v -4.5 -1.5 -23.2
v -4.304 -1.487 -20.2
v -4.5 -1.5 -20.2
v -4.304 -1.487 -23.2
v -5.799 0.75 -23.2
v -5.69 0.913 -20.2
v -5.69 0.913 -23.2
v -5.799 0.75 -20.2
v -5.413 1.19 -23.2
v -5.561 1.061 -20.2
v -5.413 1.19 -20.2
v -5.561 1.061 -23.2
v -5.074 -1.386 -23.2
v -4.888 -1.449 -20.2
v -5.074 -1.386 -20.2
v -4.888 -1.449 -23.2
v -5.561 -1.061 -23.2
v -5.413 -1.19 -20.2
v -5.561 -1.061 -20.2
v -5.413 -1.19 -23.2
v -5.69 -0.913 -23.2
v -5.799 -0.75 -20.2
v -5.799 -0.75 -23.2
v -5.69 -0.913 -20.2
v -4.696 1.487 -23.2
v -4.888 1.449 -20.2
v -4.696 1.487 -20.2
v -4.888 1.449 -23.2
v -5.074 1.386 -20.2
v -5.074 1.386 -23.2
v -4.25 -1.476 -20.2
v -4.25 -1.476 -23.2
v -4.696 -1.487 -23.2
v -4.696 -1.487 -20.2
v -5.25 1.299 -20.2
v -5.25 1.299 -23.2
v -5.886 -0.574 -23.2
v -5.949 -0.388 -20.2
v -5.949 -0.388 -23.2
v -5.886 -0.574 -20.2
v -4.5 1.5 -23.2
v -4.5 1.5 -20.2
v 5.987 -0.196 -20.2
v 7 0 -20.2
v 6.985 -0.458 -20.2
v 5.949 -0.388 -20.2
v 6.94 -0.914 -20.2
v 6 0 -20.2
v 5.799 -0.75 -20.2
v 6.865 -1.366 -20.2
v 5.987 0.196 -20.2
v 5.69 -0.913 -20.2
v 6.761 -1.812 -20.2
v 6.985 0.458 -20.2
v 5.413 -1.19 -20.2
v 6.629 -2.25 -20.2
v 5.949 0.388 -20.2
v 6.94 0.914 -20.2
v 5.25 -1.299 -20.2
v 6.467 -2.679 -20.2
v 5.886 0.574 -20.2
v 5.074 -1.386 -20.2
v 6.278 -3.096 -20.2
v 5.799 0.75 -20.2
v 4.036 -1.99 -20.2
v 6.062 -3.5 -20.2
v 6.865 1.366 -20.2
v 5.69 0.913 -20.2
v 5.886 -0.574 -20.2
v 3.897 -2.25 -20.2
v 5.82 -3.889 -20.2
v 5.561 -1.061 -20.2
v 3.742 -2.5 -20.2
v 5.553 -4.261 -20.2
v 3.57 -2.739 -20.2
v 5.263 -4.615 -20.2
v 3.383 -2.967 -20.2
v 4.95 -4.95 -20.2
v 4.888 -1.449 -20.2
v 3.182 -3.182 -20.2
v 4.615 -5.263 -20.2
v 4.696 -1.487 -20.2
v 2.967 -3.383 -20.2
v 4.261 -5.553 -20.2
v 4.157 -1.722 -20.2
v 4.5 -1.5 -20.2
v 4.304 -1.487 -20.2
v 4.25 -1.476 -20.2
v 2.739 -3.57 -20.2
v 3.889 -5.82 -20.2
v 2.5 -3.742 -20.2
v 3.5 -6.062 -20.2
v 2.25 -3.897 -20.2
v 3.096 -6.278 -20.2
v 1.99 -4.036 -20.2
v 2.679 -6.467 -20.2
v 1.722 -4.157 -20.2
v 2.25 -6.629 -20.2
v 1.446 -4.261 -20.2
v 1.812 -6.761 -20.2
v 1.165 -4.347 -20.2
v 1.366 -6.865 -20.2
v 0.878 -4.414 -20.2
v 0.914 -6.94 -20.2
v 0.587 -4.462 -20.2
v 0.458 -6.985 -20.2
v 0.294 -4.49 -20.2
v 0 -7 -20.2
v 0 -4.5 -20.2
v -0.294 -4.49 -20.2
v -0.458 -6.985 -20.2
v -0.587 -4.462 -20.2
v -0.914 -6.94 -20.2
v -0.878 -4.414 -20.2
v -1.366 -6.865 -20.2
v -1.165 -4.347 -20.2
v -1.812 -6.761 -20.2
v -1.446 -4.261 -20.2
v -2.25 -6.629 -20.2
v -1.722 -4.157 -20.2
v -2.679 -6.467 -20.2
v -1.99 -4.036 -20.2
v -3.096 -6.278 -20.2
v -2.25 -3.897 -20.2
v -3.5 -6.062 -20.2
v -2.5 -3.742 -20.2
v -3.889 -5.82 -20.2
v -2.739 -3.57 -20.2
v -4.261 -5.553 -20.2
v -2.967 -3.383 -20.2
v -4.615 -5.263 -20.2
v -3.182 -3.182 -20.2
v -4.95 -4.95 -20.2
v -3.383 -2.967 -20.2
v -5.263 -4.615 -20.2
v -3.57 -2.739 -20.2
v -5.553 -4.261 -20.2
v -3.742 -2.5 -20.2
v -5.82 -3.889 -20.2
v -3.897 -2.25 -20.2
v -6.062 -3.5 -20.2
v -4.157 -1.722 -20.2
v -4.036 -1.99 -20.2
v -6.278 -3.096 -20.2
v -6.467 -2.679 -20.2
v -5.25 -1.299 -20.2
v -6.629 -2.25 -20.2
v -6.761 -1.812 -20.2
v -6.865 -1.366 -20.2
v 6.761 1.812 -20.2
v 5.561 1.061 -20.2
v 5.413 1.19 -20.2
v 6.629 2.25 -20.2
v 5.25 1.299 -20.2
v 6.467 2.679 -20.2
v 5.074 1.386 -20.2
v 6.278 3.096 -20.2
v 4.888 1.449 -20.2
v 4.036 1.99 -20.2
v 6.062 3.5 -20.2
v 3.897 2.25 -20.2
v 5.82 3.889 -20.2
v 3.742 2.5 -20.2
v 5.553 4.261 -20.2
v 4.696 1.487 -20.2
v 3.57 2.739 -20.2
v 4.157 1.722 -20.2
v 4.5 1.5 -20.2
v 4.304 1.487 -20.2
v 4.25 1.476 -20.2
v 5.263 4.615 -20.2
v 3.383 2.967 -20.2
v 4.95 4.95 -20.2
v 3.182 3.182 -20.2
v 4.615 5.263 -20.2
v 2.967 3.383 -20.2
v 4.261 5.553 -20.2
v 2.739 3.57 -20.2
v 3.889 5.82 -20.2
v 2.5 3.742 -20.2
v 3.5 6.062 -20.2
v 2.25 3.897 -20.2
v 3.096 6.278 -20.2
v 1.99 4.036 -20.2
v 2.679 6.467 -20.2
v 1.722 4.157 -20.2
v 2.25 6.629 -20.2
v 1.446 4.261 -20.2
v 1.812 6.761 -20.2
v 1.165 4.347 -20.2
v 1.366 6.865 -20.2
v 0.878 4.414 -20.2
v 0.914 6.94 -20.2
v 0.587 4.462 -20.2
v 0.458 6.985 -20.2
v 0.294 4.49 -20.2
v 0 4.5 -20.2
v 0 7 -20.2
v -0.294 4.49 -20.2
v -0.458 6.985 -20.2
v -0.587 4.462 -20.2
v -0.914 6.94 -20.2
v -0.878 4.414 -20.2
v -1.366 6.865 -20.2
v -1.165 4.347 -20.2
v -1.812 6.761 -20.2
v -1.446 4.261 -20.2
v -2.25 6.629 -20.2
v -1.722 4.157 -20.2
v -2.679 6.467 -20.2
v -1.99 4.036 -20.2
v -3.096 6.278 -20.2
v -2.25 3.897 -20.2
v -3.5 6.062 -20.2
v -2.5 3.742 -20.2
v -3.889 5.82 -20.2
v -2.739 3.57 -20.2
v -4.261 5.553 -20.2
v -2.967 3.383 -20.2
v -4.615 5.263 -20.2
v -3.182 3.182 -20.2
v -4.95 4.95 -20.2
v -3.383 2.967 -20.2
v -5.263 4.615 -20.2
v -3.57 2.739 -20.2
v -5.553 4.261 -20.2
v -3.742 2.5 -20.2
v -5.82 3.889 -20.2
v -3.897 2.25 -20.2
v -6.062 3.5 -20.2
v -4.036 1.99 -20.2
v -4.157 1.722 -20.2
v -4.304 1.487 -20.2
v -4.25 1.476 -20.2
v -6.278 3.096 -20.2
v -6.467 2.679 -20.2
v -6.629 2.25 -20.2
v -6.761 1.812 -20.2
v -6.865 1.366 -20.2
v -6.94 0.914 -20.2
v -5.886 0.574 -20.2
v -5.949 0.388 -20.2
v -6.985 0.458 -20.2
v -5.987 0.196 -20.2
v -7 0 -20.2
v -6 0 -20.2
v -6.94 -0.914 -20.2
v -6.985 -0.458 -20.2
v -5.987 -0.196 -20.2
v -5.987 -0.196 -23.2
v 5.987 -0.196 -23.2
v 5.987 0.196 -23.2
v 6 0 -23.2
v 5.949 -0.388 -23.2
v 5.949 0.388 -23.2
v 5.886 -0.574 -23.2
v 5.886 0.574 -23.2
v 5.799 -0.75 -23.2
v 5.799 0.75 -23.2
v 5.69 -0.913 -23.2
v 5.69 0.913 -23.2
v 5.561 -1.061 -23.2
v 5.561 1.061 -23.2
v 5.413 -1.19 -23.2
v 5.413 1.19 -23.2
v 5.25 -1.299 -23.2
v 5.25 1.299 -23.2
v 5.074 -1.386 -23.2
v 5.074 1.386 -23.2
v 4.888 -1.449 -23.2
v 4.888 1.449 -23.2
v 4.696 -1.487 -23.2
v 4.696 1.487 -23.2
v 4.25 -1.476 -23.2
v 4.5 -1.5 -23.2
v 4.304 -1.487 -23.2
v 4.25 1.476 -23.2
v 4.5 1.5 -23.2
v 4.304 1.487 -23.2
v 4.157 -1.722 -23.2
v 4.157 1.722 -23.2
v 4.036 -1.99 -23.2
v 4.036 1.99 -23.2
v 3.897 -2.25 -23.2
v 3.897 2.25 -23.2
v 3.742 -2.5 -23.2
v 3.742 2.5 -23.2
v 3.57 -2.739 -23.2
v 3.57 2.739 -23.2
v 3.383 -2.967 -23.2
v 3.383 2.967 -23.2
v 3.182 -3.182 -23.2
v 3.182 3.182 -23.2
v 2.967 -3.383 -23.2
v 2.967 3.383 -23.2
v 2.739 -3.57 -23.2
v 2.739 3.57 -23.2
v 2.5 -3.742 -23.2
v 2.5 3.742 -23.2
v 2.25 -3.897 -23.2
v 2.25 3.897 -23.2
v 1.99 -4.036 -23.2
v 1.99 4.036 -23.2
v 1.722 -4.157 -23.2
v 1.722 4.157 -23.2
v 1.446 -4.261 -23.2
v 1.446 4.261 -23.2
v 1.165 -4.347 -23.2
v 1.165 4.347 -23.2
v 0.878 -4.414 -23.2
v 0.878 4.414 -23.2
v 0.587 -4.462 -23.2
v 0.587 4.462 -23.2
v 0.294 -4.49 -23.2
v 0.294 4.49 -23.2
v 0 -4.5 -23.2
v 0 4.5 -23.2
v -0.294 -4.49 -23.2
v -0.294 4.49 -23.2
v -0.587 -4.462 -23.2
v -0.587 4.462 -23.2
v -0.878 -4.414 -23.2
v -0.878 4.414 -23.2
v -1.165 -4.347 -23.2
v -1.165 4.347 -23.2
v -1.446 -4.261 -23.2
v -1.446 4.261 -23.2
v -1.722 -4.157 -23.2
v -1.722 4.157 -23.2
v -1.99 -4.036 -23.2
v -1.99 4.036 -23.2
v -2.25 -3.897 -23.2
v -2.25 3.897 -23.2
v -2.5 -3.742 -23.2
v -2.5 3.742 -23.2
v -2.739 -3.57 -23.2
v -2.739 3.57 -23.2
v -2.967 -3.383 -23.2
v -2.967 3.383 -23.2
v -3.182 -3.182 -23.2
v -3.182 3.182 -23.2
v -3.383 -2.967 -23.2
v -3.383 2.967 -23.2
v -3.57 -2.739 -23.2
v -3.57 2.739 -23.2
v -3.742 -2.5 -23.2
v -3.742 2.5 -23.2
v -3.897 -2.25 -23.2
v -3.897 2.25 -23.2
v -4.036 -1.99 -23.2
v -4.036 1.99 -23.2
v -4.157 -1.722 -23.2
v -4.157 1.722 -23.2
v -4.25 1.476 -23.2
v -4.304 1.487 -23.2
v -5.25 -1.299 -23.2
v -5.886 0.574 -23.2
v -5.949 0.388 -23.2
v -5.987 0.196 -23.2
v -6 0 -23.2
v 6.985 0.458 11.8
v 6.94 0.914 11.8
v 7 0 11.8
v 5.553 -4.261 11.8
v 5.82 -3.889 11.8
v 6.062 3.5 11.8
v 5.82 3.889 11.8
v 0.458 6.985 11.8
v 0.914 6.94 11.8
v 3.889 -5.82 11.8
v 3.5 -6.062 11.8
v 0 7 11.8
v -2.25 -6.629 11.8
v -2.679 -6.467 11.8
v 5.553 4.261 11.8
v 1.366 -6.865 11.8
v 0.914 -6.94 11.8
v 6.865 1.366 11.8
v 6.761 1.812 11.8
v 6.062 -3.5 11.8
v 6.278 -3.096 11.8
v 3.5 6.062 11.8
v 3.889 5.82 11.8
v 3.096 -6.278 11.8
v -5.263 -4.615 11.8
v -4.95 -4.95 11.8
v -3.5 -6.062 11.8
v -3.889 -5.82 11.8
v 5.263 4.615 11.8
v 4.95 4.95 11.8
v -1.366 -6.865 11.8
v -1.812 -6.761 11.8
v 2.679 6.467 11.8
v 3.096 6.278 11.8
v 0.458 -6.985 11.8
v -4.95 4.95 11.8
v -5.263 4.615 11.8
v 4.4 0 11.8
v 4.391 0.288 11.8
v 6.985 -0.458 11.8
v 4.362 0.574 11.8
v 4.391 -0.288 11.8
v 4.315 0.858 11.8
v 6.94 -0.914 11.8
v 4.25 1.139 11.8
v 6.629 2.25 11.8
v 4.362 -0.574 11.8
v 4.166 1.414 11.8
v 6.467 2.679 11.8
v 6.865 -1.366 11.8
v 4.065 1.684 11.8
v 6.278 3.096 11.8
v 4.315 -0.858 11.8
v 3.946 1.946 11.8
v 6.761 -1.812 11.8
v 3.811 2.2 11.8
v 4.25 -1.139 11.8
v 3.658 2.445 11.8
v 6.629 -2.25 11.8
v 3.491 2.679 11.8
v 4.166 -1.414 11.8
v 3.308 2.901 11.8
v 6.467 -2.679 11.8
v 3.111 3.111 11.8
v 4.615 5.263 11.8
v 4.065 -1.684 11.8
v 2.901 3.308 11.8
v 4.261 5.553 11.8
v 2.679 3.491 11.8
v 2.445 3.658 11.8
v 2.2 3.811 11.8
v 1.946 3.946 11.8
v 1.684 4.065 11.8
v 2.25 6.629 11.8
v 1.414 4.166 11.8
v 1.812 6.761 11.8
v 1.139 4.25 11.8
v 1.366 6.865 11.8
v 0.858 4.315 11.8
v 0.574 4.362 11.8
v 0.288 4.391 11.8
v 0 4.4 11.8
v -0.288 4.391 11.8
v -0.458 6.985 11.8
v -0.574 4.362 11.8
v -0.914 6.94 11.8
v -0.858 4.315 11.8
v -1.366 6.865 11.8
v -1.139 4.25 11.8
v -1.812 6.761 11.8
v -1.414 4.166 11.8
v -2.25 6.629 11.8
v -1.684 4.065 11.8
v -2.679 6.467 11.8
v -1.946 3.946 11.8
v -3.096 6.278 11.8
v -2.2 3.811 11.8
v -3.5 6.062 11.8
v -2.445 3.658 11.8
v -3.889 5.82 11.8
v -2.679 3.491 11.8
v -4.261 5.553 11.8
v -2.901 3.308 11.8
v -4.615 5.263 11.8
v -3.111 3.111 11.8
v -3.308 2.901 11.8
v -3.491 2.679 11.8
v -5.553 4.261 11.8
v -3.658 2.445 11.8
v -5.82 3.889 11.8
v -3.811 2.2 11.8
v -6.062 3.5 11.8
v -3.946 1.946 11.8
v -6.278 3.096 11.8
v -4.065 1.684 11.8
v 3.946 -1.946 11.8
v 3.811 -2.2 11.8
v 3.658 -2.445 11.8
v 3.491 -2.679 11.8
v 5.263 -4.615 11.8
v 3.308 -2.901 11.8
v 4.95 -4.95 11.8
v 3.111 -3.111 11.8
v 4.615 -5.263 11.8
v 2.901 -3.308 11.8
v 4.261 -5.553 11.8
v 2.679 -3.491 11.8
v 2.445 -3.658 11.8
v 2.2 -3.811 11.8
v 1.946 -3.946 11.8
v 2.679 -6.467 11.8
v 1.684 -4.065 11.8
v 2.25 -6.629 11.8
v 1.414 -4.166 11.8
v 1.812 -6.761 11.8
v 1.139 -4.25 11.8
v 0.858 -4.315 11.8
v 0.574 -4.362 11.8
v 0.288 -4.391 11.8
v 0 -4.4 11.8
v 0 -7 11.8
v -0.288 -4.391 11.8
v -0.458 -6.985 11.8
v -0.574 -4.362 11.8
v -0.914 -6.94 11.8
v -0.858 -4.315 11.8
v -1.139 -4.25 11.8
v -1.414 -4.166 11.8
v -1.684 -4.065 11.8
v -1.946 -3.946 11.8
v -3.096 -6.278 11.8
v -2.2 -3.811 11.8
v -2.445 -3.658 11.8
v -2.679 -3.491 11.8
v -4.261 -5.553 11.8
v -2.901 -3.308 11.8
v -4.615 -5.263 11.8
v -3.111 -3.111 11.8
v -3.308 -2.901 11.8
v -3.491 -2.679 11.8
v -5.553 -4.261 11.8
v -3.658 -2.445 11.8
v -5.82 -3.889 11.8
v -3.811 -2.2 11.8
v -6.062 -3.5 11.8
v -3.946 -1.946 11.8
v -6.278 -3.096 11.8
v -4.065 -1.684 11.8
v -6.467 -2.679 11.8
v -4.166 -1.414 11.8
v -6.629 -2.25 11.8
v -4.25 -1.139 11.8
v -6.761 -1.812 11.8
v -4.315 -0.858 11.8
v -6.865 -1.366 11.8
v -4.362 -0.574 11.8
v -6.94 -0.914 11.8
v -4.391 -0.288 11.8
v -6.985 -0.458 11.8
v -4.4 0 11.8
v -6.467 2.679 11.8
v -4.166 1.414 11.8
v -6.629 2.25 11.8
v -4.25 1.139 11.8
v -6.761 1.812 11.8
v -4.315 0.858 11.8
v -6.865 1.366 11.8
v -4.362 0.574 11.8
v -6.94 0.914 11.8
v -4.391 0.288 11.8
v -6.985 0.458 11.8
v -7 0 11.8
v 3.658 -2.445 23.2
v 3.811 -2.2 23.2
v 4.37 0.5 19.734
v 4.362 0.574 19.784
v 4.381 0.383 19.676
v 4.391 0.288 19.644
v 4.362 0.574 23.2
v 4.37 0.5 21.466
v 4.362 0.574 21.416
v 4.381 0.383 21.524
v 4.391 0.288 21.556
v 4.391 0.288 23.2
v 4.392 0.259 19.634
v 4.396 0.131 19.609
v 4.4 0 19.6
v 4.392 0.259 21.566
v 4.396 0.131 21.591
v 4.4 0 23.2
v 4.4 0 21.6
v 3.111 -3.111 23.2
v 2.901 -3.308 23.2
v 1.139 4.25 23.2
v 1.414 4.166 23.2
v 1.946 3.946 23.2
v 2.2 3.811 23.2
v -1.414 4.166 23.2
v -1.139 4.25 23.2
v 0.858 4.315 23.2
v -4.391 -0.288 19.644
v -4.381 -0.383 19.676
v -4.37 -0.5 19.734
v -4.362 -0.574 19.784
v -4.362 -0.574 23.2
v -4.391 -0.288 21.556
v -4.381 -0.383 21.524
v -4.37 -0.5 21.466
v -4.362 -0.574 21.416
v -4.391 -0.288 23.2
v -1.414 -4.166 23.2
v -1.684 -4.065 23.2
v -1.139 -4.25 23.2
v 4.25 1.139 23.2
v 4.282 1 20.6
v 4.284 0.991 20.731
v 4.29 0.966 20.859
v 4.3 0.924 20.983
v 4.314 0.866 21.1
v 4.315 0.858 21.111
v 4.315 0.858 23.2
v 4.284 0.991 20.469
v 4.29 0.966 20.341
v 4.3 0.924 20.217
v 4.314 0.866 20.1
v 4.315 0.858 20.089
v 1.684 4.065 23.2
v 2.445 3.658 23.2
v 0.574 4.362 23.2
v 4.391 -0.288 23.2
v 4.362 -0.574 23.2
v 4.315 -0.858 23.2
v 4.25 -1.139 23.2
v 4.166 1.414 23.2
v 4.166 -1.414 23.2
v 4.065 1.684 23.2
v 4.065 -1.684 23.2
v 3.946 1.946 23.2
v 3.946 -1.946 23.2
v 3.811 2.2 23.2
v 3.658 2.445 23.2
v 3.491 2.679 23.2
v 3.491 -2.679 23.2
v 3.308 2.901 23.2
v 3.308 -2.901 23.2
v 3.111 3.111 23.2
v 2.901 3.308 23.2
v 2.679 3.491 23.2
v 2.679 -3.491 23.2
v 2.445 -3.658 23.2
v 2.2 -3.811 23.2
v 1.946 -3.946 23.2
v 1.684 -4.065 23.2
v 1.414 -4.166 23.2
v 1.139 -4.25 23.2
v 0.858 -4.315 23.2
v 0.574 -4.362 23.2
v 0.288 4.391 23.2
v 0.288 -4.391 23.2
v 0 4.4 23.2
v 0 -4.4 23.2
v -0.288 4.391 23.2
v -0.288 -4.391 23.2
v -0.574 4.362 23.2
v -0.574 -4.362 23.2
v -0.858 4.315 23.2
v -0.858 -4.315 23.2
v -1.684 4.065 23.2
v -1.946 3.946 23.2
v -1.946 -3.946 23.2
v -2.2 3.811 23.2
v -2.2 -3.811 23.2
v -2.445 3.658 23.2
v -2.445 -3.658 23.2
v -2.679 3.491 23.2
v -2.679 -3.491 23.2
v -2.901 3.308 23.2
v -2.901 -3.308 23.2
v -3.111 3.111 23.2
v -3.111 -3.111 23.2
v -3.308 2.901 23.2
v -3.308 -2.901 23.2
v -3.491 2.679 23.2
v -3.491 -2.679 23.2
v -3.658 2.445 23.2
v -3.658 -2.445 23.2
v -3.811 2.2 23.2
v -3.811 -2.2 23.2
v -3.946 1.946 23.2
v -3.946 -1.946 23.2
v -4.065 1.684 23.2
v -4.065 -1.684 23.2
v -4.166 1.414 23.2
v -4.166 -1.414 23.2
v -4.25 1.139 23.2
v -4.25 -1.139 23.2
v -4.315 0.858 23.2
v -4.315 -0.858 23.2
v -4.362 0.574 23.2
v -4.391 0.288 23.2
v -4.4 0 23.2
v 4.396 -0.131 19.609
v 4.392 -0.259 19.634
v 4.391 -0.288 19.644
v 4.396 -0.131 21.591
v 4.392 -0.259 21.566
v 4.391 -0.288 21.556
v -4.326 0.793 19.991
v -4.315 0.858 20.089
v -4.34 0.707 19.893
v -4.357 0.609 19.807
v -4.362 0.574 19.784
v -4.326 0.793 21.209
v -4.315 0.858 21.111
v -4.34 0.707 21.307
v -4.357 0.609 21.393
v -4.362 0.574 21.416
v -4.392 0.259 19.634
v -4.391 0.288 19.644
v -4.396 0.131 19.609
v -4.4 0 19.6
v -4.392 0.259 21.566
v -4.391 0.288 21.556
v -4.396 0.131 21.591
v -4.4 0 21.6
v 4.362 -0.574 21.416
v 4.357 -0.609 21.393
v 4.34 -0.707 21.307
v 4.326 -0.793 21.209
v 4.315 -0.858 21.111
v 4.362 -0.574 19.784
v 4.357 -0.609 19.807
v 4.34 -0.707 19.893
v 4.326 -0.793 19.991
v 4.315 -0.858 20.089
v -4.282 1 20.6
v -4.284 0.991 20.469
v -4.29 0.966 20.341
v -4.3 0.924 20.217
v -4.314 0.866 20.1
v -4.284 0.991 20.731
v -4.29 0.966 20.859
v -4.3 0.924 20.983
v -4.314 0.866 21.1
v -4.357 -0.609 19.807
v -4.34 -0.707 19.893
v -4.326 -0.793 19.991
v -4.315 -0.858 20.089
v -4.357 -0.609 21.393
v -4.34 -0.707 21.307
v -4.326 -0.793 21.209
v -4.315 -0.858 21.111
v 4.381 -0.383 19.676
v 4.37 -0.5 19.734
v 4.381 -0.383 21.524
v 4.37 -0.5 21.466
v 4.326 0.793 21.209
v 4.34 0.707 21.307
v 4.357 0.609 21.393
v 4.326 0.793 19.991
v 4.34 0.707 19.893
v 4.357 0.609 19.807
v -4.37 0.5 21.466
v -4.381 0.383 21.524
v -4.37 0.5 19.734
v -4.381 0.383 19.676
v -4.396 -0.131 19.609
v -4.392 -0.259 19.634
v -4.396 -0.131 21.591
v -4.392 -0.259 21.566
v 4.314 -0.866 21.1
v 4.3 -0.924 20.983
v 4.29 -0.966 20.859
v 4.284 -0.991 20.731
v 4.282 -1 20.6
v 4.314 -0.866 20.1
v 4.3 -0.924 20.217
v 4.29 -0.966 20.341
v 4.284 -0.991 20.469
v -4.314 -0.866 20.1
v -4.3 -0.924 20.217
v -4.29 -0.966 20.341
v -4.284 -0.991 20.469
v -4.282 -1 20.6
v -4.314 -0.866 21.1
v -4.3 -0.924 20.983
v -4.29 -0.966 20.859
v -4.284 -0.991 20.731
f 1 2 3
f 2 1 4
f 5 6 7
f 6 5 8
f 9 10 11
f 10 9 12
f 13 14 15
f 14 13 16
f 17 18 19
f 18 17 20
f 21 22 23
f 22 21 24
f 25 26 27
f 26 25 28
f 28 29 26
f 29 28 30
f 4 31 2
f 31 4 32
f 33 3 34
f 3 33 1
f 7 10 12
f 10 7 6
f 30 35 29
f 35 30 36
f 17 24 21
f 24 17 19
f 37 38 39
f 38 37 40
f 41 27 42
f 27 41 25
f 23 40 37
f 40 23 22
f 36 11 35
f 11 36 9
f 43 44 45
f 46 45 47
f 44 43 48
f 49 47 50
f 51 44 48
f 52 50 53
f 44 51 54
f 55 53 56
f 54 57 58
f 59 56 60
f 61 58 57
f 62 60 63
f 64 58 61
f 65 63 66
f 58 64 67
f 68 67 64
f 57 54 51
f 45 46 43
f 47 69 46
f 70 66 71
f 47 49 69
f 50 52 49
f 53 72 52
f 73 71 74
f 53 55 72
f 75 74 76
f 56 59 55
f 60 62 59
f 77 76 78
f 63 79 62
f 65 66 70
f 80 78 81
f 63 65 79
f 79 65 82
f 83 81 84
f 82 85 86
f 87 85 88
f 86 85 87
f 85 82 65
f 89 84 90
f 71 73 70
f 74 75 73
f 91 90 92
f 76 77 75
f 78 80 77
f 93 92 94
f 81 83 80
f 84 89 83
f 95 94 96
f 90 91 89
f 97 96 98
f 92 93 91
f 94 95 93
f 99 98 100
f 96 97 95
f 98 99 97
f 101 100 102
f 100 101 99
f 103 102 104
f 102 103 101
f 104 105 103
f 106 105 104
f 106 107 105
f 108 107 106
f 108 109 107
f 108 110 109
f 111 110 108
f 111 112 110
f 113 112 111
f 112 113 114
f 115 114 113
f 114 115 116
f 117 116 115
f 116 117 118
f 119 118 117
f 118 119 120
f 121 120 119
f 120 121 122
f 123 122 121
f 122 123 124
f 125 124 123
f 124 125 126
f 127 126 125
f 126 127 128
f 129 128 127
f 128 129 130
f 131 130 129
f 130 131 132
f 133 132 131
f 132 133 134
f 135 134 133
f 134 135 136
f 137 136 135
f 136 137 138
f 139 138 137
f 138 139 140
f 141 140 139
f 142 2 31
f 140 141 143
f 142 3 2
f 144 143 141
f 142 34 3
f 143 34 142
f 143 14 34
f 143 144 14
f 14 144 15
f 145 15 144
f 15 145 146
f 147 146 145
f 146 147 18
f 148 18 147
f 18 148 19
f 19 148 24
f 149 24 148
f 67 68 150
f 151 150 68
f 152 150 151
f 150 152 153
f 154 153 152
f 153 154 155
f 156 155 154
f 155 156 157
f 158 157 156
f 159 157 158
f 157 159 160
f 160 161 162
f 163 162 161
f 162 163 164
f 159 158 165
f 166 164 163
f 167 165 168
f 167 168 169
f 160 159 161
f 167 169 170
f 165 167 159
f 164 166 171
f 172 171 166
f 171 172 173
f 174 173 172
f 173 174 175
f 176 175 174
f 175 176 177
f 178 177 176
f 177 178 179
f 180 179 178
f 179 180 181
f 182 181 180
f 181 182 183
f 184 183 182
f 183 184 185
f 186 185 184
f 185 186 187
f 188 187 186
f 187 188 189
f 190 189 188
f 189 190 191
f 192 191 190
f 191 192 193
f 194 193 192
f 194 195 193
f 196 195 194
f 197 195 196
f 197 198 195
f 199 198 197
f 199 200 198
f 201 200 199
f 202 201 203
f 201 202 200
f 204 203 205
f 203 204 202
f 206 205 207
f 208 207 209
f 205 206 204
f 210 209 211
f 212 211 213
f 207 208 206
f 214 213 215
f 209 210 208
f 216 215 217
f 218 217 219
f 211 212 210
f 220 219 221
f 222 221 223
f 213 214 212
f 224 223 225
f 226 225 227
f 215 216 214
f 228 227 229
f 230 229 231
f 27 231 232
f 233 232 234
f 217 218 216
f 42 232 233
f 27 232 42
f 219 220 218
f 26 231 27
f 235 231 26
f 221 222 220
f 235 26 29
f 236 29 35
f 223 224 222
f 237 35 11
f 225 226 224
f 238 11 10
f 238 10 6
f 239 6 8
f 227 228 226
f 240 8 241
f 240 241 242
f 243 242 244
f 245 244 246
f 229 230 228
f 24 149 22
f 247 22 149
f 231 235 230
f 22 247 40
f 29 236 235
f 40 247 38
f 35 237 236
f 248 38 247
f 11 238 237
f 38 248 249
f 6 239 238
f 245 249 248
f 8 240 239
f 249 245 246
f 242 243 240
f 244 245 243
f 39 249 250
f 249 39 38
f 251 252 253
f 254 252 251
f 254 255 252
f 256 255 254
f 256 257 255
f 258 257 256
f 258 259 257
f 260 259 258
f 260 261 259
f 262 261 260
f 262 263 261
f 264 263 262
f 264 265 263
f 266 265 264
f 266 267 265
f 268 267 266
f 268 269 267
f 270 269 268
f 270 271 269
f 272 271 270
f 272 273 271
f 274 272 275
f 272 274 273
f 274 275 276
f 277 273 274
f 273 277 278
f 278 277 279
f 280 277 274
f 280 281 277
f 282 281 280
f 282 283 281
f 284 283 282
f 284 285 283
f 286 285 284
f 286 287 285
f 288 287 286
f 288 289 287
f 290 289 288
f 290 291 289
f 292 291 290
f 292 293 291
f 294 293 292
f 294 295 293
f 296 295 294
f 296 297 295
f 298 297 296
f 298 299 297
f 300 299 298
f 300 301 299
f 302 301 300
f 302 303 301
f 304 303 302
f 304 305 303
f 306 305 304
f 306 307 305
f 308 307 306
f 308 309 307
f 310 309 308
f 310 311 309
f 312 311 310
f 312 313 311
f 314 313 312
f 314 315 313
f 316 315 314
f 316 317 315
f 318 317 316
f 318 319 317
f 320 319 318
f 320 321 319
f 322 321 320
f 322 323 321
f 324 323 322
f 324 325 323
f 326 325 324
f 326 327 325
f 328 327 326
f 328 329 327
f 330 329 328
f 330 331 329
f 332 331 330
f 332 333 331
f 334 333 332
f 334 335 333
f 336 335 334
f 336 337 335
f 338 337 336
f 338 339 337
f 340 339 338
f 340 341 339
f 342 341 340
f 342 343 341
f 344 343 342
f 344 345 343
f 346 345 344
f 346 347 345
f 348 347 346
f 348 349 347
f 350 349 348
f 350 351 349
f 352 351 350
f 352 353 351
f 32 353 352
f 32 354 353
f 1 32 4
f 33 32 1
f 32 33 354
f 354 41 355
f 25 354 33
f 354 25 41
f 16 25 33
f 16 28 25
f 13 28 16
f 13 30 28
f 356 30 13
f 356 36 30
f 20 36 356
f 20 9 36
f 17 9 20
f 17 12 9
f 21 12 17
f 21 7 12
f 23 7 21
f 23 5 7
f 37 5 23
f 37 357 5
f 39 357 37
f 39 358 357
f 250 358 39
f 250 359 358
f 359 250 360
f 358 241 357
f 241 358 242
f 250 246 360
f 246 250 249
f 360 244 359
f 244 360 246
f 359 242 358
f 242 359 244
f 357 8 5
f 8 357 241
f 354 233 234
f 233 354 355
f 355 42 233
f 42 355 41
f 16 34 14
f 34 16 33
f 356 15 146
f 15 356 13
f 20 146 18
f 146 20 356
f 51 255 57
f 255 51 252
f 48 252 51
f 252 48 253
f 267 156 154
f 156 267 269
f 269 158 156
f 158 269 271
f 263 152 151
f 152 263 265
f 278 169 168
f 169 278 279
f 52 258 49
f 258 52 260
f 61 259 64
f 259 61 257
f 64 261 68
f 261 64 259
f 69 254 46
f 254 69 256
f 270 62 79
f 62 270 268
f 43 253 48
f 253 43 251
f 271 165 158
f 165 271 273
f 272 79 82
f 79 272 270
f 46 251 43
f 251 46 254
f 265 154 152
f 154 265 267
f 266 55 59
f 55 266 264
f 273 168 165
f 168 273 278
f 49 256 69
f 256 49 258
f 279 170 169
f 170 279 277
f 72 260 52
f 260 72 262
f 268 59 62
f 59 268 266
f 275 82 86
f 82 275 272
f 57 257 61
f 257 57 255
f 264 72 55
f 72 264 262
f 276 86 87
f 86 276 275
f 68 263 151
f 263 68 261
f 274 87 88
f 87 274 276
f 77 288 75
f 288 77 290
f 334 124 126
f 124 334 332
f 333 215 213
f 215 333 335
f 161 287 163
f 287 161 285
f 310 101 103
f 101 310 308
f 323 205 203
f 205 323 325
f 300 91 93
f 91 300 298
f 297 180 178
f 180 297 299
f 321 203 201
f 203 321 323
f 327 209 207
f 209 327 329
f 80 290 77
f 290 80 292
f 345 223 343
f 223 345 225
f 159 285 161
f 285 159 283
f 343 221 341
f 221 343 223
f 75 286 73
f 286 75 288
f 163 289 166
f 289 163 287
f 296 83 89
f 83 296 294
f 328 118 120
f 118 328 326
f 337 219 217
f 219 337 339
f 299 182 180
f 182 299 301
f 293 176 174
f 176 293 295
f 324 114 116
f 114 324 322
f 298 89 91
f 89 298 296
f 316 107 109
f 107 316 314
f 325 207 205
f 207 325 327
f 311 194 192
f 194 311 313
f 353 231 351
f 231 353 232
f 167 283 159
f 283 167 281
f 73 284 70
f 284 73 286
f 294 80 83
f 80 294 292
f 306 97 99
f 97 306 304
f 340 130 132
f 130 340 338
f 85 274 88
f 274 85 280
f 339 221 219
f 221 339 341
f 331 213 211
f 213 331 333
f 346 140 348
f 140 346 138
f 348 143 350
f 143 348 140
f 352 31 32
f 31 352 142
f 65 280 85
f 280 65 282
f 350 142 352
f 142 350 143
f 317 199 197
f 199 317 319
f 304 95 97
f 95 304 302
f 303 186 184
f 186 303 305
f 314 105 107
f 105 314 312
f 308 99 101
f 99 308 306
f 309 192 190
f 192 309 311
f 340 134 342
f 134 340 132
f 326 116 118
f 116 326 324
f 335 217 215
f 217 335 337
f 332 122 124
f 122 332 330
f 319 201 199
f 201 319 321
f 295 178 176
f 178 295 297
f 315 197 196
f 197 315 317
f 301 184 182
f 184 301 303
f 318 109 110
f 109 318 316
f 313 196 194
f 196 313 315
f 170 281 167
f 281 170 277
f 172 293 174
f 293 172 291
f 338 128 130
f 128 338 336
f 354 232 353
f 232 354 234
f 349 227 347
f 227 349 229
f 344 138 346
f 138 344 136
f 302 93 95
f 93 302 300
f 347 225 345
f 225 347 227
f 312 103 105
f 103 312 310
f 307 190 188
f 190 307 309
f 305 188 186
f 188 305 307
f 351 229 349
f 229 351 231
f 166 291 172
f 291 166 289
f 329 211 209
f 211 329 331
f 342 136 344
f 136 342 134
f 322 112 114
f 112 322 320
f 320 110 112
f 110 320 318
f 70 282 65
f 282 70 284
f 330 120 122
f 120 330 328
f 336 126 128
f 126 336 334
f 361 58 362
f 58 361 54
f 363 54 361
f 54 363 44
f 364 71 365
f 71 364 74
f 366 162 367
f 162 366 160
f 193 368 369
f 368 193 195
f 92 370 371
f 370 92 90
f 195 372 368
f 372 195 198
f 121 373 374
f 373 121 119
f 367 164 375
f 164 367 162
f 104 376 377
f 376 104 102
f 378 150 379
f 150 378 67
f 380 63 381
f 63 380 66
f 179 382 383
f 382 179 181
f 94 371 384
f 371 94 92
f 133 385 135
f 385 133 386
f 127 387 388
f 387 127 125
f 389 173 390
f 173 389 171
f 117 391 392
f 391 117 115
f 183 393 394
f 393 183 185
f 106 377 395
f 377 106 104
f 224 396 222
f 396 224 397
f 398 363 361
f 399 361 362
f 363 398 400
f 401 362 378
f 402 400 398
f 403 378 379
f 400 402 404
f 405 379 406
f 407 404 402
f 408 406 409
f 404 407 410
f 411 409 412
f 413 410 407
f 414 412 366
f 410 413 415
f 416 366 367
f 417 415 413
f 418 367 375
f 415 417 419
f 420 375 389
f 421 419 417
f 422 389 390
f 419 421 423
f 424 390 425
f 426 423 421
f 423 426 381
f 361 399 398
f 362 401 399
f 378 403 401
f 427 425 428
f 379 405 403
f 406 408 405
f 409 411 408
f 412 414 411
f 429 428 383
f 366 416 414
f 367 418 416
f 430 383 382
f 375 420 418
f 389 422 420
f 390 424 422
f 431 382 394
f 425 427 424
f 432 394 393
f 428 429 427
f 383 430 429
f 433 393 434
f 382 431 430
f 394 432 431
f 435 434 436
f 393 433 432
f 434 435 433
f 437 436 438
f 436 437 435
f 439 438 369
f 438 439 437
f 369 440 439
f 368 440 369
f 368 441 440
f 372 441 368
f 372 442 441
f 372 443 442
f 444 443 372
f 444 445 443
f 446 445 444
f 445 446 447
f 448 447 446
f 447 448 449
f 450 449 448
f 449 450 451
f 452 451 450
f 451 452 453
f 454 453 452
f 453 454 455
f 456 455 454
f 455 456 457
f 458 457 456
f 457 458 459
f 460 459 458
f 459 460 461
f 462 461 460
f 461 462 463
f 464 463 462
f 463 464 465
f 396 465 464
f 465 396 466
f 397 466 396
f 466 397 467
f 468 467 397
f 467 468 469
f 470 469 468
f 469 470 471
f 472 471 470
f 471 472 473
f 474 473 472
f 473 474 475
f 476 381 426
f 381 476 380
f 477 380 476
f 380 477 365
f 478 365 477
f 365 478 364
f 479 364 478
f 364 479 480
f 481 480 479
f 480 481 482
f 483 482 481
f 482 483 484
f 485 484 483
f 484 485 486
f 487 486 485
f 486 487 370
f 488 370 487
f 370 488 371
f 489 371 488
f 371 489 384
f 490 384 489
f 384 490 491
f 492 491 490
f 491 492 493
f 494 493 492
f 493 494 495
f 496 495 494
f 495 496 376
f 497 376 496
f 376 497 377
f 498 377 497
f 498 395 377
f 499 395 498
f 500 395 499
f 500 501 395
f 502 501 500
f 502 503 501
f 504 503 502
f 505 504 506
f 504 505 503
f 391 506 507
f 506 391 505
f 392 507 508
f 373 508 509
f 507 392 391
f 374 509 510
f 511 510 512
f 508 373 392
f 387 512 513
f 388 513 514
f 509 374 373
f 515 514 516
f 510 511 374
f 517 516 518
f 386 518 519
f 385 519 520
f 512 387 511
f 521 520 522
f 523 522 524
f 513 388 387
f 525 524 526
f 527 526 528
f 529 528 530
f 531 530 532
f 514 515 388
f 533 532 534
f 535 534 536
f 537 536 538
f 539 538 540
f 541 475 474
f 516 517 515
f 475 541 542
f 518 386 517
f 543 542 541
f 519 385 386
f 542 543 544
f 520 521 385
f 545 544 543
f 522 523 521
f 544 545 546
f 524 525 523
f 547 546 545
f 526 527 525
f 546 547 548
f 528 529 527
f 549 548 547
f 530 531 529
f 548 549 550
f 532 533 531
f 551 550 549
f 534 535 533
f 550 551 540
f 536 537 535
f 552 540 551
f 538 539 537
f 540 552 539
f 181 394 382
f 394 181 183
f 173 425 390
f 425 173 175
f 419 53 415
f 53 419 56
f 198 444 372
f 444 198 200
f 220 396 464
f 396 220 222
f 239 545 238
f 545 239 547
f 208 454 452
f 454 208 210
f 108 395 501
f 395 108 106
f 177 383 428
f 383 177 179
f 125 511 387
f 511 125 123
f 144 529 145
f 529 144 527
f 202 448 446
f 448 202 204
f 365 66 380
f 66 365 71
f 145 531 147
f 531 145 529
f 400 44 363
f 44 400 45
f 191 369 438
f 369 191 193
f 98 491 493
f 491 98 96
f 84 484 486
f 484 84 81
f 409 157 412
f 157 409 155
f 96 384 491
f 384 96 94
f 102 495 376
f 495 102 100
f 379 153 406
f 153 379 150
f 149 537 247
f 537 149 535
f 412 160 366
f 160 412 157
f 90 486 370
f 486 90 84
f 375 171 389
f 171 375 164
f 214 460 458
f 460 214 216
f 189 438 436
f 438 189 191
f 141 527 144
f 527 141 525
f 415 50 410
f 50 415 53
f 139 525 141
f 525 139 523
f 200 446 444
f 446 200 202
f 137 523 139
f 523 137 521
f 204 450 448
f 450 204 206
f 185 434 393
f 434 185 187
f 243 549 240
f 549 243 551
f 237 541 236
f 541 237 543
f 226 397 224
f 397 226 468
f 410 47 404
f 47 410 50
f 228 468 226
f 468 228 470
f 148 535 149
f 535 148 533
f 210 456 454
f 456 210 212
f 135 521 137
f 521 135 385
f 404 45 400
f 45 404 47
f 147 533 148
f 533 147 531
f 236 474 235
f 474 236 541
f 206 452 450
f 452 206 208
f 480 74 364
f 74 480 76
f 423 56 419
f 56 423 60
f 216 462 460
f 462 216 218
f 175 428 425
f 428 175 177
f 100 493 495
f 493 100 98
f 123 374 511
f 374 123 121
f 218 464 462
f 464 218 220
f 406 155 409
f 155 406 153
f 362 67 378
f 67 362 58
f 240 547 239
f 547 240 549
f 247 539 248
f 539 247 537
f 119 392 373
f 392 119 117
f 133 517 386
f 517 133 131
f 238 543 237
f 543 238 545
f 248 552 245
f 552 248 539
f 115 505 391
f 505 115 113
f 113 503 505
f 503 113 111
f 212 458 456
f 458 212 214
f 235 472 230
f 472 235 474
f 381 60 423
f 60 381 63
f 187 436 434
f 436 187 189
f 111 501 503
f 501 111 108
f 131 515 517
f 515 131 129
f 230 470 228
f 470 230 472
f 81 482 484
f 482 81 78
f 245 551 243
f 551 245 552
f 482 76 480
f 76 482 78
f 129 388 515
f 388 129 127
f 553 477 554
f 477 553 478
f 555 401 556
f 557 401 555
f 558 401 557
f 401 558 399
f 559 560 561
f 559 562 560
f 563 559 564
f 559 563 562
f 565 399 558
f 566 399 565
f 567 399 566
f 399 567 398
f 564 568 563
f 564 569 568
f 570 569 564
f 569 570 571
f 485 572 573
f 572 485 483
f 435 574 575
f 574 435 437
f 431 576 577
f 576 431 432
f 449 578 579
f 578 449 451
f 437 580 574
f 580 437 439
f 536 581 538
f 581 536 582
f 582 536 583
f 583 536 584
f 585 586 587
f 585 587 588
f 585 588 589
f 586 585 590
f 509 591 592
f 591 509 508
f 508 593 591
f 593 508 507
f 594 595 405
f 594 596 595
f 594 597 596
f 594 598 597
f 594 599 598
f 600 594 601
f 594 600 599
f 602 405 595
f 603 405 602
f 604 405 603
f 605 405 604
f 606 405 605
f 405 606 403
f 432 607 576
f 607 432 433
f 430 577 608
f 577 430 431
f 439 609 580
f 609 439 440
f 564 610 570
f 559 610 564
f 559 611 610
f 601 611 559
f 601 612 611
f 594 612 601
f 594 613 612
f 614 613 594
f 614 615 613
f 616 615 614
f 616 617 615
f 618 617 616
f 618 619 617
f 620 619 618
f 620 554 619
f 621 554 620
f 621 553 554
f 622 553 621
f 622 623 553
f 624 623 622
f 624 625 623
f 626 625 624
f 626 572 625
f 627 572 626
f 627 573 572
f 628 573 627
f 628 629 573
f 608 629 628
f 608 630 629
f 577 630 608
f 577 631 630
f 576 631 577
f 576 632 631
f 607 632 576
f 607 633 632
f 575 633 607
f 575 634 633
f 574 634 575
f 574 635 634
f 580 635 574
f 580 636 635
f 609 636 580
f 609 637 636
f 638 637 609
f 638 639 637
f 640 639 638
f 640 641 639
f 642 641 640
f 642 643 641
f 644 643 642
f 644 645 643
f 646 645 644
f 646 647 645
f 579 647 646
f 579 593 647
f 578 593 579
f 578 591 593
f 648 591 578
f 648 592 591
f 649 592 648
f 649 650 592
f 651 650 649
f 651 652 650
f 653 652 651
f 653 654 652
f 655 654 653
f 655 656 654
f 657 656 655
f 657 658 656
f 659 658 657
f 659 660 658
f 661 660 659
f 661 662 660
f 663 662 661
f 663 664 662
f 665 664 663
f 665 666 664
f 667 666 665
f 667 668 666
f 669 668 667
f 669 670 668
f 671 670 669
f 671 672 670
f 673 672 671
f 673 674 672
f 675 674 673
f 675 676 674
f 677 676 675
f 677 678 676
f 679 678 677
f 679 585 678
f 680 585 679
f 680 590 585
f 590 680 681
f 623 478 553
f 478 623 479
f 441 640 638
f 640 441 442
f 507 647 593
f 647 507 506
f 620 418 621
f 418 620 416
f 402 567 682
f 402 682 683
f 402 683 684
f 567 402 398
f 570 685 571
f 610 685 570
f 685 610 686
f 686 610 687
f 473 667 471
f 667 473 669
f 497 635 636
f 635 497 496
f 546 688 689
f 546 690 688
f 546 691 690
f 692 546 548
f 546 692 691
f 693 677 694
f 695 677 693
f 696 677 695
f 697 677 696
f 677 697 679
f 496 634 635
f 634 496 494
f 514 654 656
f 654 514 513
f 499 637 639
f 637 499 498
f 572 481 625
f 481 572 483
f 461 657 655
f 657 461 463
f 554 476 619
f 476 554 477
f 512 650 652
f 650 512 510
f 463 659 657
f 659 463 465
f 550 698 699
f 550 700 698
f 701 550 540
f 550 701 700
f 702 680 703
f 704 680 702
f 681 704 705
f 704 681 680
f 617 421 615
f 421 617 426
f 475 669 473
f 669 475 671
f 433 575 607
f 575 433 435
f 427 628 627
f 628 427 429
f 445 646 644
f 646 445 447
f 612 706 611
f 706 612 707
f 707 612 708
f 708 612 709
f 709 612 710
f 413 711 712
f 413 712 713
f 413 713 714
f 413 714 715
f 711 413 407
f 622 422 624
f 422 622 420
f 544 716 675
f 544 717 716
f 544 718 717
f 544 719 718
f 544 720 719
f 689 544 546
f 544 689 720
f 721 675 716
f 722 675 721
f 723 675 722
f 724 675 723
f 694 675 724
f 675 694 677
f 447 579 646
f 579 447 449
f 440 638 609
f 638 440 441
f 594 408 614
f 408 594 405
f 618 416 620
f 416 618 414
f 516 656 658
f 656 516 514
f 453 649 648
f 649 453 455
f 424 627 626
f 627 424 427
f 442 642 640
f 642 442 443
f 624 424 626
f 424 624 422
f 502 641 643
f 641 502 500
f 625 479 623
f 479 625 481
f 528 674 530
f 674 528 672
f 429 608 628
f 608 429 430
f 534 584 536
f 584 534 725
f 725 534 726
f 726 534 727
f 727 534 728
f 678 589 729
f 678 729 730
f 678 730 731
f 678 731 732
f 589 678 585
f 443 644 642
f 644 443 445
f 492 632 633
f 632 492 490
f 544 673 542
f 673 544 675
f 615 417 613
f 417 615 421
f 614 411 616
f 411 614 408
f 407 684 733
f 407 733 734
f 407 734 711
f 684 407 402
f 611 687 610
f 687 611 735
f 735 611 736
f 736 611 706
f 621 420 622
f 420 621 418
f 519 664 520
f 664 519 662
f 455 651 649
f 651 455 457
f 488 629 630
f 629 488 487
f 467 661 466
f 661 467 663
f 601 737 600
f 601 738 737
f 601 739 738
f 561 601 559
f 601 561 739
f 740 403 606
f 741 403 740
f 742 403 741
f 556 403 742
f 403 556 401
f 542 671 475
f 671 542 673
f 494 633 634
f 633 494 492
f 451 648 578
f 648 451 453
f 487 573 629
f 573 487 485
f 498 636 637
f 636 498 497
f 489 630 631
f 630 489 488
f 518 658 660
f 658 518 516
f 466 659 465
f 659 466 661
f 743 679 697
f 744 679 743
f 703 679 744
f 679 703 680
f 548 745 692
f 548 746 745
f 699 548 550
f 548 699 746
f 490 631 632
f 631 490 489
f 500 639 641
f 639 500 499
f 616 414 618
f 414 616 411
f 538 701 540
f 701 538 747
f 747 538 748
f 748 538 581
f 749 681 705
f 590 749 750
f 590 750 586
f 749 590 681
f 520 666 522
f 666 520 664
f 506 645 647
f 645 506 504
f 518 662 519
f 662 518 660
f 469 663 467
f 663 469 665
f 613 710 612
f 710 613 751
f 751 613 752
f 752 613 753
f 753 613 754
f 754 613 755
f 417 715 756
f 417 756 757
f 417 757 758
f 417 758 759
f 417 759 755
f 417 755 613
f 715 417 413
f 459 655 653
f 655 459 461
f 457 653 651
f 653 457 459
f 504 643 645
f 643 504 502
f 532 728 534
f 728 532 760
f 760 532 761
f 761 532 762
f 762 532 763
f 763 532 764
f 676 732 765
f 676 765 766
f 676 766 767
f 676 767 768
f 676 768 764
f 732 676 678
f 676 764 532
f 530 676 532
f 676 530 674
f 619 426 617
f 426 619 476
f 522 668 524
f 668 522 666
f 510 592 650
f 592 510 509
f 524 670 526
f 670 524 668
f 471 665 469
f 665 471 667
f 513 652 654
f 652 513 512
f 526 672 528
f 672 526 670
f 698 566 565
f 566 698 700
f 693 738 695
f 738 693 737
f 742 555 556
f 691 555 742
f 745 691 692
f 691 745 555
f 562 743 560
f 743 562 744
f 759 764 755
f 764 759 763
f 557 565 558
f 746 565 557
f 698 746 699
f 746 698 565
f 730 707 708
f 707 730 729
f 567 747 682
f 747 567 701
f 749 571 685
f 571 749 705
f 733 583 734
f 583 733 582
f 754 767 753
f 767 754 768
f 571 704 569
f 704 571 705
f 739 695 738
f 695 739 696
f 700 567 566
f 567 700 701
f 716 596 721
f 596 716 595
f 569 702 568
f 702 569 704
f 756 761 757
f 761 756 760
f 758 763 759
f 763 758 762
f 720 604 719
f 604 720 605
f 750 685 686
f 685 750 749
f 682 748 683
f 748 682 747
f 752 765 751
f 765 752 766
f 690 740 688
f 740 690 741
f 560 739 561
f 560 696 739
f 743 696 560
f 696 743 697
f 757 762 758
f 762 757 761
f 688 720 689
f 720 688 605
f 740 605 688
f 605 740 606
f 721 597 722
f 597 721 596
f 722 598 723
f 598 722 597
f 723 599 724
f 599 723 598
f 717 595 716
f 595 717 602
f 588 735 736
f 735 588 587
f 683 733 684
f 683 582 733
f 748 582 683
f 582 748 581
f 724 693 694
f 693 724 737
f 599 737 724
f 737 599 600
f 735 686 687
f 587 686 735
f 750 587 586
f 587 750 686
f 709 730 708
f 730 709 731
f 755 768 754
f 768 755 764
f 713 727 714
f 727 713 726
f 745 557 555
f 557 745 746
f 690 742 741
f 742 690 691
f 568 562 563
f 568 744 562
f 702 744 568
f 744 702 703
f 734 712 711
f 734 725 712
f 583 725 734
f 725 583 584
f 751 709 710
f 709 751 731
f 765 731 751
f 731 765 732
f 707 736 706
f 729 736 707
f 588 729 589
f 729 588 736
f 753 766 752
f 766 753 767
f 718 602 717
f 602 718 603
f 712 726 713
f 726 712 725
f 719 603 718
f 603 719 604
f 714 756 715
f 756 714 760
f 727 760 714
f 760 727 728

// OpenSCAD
// Part A9: stepped axle with upper cross-hole.
// SPDX-License-Identifier: MIT
//
// Local origin convention:
// - XY origin is the axle axis.
// - Z origin is the overall part midplane.
// - Assembly placement and animation should be applied outside this file.

module part_a9(
    body_d = 14.0,
    body_h = 32.0,
    upper_d = 8.8,
    upper_h = 11.4,
    bottom_core_d = 9.0,
    bottom_pin_d = 3.0,
    bottom_pin_h = 3.0,
    top_hole_d = 2.0,
    // Drawing indicates centerline 8.8 mm above body top.
    top_hole_from_body_top = 8.8
) {
    total_h = bottom_pin_h + body_h + upper_h;

    // Z reference:
    // [0..bottom_pin_h] bottom pins
    // [bottom_pin_h..bottom_pin_h+body_h] main body
    // [body top..body top+upper_h] upper stem
    z0 = -total_h / 2;
    z_body = z0 + bottom_pin_h;
    z_body_top = z_body + body_h;
    z_top = z_body_top + upper_h;
    z_hole = z_body_top + top_hole_from_body_top;

    difference() {
        union() {
            // Bottom core section (Ø9.0 x 3.0) below main Ø14 body.
            translate([0, 0, z0])
                cylinder(d = bottom_core_d, h = bottom_pin_h, center = false, $fn = 96);

            // Main shaft body.
            translate([0, 0, z_body]) cylinder(d = body_d, h = body_h, center = false, $fn = 96);

            // Upper stem.
            translate([0, 0, z_body_top]) cylinder(d = upper_d, h = upper_h, center = false, $fn = 96);

            // Two bottom offset pins (Ø3.0) to match bottom view callout.
            // Centers offset from origin by Ø9/2 so they intersect the Ø9 core.
            for (sx = [-1, 1])
                translate([sx * (bottom_core_d / 2), 0, z0])
                    cylinder(d = bottom_pin_d, h = bottom_pin_h, center = false, $fn = 48);
        }

        // Ø2.0 transverse hole through upper stem.
        // Oriented to match drawing top view (horizontal in XY view).
        translate([0, 0, z_hole])
            rotate([0, 90, 0])
                cylinder(d = top_hole_d, h = upper_d + 2.0, center = true, $fn = 48);
    }
}


// ---- "main guard" ----
// Default to previewing when opened directly:
if (is_undef(__LIB_MODE__)) {
    part_a9();
}
